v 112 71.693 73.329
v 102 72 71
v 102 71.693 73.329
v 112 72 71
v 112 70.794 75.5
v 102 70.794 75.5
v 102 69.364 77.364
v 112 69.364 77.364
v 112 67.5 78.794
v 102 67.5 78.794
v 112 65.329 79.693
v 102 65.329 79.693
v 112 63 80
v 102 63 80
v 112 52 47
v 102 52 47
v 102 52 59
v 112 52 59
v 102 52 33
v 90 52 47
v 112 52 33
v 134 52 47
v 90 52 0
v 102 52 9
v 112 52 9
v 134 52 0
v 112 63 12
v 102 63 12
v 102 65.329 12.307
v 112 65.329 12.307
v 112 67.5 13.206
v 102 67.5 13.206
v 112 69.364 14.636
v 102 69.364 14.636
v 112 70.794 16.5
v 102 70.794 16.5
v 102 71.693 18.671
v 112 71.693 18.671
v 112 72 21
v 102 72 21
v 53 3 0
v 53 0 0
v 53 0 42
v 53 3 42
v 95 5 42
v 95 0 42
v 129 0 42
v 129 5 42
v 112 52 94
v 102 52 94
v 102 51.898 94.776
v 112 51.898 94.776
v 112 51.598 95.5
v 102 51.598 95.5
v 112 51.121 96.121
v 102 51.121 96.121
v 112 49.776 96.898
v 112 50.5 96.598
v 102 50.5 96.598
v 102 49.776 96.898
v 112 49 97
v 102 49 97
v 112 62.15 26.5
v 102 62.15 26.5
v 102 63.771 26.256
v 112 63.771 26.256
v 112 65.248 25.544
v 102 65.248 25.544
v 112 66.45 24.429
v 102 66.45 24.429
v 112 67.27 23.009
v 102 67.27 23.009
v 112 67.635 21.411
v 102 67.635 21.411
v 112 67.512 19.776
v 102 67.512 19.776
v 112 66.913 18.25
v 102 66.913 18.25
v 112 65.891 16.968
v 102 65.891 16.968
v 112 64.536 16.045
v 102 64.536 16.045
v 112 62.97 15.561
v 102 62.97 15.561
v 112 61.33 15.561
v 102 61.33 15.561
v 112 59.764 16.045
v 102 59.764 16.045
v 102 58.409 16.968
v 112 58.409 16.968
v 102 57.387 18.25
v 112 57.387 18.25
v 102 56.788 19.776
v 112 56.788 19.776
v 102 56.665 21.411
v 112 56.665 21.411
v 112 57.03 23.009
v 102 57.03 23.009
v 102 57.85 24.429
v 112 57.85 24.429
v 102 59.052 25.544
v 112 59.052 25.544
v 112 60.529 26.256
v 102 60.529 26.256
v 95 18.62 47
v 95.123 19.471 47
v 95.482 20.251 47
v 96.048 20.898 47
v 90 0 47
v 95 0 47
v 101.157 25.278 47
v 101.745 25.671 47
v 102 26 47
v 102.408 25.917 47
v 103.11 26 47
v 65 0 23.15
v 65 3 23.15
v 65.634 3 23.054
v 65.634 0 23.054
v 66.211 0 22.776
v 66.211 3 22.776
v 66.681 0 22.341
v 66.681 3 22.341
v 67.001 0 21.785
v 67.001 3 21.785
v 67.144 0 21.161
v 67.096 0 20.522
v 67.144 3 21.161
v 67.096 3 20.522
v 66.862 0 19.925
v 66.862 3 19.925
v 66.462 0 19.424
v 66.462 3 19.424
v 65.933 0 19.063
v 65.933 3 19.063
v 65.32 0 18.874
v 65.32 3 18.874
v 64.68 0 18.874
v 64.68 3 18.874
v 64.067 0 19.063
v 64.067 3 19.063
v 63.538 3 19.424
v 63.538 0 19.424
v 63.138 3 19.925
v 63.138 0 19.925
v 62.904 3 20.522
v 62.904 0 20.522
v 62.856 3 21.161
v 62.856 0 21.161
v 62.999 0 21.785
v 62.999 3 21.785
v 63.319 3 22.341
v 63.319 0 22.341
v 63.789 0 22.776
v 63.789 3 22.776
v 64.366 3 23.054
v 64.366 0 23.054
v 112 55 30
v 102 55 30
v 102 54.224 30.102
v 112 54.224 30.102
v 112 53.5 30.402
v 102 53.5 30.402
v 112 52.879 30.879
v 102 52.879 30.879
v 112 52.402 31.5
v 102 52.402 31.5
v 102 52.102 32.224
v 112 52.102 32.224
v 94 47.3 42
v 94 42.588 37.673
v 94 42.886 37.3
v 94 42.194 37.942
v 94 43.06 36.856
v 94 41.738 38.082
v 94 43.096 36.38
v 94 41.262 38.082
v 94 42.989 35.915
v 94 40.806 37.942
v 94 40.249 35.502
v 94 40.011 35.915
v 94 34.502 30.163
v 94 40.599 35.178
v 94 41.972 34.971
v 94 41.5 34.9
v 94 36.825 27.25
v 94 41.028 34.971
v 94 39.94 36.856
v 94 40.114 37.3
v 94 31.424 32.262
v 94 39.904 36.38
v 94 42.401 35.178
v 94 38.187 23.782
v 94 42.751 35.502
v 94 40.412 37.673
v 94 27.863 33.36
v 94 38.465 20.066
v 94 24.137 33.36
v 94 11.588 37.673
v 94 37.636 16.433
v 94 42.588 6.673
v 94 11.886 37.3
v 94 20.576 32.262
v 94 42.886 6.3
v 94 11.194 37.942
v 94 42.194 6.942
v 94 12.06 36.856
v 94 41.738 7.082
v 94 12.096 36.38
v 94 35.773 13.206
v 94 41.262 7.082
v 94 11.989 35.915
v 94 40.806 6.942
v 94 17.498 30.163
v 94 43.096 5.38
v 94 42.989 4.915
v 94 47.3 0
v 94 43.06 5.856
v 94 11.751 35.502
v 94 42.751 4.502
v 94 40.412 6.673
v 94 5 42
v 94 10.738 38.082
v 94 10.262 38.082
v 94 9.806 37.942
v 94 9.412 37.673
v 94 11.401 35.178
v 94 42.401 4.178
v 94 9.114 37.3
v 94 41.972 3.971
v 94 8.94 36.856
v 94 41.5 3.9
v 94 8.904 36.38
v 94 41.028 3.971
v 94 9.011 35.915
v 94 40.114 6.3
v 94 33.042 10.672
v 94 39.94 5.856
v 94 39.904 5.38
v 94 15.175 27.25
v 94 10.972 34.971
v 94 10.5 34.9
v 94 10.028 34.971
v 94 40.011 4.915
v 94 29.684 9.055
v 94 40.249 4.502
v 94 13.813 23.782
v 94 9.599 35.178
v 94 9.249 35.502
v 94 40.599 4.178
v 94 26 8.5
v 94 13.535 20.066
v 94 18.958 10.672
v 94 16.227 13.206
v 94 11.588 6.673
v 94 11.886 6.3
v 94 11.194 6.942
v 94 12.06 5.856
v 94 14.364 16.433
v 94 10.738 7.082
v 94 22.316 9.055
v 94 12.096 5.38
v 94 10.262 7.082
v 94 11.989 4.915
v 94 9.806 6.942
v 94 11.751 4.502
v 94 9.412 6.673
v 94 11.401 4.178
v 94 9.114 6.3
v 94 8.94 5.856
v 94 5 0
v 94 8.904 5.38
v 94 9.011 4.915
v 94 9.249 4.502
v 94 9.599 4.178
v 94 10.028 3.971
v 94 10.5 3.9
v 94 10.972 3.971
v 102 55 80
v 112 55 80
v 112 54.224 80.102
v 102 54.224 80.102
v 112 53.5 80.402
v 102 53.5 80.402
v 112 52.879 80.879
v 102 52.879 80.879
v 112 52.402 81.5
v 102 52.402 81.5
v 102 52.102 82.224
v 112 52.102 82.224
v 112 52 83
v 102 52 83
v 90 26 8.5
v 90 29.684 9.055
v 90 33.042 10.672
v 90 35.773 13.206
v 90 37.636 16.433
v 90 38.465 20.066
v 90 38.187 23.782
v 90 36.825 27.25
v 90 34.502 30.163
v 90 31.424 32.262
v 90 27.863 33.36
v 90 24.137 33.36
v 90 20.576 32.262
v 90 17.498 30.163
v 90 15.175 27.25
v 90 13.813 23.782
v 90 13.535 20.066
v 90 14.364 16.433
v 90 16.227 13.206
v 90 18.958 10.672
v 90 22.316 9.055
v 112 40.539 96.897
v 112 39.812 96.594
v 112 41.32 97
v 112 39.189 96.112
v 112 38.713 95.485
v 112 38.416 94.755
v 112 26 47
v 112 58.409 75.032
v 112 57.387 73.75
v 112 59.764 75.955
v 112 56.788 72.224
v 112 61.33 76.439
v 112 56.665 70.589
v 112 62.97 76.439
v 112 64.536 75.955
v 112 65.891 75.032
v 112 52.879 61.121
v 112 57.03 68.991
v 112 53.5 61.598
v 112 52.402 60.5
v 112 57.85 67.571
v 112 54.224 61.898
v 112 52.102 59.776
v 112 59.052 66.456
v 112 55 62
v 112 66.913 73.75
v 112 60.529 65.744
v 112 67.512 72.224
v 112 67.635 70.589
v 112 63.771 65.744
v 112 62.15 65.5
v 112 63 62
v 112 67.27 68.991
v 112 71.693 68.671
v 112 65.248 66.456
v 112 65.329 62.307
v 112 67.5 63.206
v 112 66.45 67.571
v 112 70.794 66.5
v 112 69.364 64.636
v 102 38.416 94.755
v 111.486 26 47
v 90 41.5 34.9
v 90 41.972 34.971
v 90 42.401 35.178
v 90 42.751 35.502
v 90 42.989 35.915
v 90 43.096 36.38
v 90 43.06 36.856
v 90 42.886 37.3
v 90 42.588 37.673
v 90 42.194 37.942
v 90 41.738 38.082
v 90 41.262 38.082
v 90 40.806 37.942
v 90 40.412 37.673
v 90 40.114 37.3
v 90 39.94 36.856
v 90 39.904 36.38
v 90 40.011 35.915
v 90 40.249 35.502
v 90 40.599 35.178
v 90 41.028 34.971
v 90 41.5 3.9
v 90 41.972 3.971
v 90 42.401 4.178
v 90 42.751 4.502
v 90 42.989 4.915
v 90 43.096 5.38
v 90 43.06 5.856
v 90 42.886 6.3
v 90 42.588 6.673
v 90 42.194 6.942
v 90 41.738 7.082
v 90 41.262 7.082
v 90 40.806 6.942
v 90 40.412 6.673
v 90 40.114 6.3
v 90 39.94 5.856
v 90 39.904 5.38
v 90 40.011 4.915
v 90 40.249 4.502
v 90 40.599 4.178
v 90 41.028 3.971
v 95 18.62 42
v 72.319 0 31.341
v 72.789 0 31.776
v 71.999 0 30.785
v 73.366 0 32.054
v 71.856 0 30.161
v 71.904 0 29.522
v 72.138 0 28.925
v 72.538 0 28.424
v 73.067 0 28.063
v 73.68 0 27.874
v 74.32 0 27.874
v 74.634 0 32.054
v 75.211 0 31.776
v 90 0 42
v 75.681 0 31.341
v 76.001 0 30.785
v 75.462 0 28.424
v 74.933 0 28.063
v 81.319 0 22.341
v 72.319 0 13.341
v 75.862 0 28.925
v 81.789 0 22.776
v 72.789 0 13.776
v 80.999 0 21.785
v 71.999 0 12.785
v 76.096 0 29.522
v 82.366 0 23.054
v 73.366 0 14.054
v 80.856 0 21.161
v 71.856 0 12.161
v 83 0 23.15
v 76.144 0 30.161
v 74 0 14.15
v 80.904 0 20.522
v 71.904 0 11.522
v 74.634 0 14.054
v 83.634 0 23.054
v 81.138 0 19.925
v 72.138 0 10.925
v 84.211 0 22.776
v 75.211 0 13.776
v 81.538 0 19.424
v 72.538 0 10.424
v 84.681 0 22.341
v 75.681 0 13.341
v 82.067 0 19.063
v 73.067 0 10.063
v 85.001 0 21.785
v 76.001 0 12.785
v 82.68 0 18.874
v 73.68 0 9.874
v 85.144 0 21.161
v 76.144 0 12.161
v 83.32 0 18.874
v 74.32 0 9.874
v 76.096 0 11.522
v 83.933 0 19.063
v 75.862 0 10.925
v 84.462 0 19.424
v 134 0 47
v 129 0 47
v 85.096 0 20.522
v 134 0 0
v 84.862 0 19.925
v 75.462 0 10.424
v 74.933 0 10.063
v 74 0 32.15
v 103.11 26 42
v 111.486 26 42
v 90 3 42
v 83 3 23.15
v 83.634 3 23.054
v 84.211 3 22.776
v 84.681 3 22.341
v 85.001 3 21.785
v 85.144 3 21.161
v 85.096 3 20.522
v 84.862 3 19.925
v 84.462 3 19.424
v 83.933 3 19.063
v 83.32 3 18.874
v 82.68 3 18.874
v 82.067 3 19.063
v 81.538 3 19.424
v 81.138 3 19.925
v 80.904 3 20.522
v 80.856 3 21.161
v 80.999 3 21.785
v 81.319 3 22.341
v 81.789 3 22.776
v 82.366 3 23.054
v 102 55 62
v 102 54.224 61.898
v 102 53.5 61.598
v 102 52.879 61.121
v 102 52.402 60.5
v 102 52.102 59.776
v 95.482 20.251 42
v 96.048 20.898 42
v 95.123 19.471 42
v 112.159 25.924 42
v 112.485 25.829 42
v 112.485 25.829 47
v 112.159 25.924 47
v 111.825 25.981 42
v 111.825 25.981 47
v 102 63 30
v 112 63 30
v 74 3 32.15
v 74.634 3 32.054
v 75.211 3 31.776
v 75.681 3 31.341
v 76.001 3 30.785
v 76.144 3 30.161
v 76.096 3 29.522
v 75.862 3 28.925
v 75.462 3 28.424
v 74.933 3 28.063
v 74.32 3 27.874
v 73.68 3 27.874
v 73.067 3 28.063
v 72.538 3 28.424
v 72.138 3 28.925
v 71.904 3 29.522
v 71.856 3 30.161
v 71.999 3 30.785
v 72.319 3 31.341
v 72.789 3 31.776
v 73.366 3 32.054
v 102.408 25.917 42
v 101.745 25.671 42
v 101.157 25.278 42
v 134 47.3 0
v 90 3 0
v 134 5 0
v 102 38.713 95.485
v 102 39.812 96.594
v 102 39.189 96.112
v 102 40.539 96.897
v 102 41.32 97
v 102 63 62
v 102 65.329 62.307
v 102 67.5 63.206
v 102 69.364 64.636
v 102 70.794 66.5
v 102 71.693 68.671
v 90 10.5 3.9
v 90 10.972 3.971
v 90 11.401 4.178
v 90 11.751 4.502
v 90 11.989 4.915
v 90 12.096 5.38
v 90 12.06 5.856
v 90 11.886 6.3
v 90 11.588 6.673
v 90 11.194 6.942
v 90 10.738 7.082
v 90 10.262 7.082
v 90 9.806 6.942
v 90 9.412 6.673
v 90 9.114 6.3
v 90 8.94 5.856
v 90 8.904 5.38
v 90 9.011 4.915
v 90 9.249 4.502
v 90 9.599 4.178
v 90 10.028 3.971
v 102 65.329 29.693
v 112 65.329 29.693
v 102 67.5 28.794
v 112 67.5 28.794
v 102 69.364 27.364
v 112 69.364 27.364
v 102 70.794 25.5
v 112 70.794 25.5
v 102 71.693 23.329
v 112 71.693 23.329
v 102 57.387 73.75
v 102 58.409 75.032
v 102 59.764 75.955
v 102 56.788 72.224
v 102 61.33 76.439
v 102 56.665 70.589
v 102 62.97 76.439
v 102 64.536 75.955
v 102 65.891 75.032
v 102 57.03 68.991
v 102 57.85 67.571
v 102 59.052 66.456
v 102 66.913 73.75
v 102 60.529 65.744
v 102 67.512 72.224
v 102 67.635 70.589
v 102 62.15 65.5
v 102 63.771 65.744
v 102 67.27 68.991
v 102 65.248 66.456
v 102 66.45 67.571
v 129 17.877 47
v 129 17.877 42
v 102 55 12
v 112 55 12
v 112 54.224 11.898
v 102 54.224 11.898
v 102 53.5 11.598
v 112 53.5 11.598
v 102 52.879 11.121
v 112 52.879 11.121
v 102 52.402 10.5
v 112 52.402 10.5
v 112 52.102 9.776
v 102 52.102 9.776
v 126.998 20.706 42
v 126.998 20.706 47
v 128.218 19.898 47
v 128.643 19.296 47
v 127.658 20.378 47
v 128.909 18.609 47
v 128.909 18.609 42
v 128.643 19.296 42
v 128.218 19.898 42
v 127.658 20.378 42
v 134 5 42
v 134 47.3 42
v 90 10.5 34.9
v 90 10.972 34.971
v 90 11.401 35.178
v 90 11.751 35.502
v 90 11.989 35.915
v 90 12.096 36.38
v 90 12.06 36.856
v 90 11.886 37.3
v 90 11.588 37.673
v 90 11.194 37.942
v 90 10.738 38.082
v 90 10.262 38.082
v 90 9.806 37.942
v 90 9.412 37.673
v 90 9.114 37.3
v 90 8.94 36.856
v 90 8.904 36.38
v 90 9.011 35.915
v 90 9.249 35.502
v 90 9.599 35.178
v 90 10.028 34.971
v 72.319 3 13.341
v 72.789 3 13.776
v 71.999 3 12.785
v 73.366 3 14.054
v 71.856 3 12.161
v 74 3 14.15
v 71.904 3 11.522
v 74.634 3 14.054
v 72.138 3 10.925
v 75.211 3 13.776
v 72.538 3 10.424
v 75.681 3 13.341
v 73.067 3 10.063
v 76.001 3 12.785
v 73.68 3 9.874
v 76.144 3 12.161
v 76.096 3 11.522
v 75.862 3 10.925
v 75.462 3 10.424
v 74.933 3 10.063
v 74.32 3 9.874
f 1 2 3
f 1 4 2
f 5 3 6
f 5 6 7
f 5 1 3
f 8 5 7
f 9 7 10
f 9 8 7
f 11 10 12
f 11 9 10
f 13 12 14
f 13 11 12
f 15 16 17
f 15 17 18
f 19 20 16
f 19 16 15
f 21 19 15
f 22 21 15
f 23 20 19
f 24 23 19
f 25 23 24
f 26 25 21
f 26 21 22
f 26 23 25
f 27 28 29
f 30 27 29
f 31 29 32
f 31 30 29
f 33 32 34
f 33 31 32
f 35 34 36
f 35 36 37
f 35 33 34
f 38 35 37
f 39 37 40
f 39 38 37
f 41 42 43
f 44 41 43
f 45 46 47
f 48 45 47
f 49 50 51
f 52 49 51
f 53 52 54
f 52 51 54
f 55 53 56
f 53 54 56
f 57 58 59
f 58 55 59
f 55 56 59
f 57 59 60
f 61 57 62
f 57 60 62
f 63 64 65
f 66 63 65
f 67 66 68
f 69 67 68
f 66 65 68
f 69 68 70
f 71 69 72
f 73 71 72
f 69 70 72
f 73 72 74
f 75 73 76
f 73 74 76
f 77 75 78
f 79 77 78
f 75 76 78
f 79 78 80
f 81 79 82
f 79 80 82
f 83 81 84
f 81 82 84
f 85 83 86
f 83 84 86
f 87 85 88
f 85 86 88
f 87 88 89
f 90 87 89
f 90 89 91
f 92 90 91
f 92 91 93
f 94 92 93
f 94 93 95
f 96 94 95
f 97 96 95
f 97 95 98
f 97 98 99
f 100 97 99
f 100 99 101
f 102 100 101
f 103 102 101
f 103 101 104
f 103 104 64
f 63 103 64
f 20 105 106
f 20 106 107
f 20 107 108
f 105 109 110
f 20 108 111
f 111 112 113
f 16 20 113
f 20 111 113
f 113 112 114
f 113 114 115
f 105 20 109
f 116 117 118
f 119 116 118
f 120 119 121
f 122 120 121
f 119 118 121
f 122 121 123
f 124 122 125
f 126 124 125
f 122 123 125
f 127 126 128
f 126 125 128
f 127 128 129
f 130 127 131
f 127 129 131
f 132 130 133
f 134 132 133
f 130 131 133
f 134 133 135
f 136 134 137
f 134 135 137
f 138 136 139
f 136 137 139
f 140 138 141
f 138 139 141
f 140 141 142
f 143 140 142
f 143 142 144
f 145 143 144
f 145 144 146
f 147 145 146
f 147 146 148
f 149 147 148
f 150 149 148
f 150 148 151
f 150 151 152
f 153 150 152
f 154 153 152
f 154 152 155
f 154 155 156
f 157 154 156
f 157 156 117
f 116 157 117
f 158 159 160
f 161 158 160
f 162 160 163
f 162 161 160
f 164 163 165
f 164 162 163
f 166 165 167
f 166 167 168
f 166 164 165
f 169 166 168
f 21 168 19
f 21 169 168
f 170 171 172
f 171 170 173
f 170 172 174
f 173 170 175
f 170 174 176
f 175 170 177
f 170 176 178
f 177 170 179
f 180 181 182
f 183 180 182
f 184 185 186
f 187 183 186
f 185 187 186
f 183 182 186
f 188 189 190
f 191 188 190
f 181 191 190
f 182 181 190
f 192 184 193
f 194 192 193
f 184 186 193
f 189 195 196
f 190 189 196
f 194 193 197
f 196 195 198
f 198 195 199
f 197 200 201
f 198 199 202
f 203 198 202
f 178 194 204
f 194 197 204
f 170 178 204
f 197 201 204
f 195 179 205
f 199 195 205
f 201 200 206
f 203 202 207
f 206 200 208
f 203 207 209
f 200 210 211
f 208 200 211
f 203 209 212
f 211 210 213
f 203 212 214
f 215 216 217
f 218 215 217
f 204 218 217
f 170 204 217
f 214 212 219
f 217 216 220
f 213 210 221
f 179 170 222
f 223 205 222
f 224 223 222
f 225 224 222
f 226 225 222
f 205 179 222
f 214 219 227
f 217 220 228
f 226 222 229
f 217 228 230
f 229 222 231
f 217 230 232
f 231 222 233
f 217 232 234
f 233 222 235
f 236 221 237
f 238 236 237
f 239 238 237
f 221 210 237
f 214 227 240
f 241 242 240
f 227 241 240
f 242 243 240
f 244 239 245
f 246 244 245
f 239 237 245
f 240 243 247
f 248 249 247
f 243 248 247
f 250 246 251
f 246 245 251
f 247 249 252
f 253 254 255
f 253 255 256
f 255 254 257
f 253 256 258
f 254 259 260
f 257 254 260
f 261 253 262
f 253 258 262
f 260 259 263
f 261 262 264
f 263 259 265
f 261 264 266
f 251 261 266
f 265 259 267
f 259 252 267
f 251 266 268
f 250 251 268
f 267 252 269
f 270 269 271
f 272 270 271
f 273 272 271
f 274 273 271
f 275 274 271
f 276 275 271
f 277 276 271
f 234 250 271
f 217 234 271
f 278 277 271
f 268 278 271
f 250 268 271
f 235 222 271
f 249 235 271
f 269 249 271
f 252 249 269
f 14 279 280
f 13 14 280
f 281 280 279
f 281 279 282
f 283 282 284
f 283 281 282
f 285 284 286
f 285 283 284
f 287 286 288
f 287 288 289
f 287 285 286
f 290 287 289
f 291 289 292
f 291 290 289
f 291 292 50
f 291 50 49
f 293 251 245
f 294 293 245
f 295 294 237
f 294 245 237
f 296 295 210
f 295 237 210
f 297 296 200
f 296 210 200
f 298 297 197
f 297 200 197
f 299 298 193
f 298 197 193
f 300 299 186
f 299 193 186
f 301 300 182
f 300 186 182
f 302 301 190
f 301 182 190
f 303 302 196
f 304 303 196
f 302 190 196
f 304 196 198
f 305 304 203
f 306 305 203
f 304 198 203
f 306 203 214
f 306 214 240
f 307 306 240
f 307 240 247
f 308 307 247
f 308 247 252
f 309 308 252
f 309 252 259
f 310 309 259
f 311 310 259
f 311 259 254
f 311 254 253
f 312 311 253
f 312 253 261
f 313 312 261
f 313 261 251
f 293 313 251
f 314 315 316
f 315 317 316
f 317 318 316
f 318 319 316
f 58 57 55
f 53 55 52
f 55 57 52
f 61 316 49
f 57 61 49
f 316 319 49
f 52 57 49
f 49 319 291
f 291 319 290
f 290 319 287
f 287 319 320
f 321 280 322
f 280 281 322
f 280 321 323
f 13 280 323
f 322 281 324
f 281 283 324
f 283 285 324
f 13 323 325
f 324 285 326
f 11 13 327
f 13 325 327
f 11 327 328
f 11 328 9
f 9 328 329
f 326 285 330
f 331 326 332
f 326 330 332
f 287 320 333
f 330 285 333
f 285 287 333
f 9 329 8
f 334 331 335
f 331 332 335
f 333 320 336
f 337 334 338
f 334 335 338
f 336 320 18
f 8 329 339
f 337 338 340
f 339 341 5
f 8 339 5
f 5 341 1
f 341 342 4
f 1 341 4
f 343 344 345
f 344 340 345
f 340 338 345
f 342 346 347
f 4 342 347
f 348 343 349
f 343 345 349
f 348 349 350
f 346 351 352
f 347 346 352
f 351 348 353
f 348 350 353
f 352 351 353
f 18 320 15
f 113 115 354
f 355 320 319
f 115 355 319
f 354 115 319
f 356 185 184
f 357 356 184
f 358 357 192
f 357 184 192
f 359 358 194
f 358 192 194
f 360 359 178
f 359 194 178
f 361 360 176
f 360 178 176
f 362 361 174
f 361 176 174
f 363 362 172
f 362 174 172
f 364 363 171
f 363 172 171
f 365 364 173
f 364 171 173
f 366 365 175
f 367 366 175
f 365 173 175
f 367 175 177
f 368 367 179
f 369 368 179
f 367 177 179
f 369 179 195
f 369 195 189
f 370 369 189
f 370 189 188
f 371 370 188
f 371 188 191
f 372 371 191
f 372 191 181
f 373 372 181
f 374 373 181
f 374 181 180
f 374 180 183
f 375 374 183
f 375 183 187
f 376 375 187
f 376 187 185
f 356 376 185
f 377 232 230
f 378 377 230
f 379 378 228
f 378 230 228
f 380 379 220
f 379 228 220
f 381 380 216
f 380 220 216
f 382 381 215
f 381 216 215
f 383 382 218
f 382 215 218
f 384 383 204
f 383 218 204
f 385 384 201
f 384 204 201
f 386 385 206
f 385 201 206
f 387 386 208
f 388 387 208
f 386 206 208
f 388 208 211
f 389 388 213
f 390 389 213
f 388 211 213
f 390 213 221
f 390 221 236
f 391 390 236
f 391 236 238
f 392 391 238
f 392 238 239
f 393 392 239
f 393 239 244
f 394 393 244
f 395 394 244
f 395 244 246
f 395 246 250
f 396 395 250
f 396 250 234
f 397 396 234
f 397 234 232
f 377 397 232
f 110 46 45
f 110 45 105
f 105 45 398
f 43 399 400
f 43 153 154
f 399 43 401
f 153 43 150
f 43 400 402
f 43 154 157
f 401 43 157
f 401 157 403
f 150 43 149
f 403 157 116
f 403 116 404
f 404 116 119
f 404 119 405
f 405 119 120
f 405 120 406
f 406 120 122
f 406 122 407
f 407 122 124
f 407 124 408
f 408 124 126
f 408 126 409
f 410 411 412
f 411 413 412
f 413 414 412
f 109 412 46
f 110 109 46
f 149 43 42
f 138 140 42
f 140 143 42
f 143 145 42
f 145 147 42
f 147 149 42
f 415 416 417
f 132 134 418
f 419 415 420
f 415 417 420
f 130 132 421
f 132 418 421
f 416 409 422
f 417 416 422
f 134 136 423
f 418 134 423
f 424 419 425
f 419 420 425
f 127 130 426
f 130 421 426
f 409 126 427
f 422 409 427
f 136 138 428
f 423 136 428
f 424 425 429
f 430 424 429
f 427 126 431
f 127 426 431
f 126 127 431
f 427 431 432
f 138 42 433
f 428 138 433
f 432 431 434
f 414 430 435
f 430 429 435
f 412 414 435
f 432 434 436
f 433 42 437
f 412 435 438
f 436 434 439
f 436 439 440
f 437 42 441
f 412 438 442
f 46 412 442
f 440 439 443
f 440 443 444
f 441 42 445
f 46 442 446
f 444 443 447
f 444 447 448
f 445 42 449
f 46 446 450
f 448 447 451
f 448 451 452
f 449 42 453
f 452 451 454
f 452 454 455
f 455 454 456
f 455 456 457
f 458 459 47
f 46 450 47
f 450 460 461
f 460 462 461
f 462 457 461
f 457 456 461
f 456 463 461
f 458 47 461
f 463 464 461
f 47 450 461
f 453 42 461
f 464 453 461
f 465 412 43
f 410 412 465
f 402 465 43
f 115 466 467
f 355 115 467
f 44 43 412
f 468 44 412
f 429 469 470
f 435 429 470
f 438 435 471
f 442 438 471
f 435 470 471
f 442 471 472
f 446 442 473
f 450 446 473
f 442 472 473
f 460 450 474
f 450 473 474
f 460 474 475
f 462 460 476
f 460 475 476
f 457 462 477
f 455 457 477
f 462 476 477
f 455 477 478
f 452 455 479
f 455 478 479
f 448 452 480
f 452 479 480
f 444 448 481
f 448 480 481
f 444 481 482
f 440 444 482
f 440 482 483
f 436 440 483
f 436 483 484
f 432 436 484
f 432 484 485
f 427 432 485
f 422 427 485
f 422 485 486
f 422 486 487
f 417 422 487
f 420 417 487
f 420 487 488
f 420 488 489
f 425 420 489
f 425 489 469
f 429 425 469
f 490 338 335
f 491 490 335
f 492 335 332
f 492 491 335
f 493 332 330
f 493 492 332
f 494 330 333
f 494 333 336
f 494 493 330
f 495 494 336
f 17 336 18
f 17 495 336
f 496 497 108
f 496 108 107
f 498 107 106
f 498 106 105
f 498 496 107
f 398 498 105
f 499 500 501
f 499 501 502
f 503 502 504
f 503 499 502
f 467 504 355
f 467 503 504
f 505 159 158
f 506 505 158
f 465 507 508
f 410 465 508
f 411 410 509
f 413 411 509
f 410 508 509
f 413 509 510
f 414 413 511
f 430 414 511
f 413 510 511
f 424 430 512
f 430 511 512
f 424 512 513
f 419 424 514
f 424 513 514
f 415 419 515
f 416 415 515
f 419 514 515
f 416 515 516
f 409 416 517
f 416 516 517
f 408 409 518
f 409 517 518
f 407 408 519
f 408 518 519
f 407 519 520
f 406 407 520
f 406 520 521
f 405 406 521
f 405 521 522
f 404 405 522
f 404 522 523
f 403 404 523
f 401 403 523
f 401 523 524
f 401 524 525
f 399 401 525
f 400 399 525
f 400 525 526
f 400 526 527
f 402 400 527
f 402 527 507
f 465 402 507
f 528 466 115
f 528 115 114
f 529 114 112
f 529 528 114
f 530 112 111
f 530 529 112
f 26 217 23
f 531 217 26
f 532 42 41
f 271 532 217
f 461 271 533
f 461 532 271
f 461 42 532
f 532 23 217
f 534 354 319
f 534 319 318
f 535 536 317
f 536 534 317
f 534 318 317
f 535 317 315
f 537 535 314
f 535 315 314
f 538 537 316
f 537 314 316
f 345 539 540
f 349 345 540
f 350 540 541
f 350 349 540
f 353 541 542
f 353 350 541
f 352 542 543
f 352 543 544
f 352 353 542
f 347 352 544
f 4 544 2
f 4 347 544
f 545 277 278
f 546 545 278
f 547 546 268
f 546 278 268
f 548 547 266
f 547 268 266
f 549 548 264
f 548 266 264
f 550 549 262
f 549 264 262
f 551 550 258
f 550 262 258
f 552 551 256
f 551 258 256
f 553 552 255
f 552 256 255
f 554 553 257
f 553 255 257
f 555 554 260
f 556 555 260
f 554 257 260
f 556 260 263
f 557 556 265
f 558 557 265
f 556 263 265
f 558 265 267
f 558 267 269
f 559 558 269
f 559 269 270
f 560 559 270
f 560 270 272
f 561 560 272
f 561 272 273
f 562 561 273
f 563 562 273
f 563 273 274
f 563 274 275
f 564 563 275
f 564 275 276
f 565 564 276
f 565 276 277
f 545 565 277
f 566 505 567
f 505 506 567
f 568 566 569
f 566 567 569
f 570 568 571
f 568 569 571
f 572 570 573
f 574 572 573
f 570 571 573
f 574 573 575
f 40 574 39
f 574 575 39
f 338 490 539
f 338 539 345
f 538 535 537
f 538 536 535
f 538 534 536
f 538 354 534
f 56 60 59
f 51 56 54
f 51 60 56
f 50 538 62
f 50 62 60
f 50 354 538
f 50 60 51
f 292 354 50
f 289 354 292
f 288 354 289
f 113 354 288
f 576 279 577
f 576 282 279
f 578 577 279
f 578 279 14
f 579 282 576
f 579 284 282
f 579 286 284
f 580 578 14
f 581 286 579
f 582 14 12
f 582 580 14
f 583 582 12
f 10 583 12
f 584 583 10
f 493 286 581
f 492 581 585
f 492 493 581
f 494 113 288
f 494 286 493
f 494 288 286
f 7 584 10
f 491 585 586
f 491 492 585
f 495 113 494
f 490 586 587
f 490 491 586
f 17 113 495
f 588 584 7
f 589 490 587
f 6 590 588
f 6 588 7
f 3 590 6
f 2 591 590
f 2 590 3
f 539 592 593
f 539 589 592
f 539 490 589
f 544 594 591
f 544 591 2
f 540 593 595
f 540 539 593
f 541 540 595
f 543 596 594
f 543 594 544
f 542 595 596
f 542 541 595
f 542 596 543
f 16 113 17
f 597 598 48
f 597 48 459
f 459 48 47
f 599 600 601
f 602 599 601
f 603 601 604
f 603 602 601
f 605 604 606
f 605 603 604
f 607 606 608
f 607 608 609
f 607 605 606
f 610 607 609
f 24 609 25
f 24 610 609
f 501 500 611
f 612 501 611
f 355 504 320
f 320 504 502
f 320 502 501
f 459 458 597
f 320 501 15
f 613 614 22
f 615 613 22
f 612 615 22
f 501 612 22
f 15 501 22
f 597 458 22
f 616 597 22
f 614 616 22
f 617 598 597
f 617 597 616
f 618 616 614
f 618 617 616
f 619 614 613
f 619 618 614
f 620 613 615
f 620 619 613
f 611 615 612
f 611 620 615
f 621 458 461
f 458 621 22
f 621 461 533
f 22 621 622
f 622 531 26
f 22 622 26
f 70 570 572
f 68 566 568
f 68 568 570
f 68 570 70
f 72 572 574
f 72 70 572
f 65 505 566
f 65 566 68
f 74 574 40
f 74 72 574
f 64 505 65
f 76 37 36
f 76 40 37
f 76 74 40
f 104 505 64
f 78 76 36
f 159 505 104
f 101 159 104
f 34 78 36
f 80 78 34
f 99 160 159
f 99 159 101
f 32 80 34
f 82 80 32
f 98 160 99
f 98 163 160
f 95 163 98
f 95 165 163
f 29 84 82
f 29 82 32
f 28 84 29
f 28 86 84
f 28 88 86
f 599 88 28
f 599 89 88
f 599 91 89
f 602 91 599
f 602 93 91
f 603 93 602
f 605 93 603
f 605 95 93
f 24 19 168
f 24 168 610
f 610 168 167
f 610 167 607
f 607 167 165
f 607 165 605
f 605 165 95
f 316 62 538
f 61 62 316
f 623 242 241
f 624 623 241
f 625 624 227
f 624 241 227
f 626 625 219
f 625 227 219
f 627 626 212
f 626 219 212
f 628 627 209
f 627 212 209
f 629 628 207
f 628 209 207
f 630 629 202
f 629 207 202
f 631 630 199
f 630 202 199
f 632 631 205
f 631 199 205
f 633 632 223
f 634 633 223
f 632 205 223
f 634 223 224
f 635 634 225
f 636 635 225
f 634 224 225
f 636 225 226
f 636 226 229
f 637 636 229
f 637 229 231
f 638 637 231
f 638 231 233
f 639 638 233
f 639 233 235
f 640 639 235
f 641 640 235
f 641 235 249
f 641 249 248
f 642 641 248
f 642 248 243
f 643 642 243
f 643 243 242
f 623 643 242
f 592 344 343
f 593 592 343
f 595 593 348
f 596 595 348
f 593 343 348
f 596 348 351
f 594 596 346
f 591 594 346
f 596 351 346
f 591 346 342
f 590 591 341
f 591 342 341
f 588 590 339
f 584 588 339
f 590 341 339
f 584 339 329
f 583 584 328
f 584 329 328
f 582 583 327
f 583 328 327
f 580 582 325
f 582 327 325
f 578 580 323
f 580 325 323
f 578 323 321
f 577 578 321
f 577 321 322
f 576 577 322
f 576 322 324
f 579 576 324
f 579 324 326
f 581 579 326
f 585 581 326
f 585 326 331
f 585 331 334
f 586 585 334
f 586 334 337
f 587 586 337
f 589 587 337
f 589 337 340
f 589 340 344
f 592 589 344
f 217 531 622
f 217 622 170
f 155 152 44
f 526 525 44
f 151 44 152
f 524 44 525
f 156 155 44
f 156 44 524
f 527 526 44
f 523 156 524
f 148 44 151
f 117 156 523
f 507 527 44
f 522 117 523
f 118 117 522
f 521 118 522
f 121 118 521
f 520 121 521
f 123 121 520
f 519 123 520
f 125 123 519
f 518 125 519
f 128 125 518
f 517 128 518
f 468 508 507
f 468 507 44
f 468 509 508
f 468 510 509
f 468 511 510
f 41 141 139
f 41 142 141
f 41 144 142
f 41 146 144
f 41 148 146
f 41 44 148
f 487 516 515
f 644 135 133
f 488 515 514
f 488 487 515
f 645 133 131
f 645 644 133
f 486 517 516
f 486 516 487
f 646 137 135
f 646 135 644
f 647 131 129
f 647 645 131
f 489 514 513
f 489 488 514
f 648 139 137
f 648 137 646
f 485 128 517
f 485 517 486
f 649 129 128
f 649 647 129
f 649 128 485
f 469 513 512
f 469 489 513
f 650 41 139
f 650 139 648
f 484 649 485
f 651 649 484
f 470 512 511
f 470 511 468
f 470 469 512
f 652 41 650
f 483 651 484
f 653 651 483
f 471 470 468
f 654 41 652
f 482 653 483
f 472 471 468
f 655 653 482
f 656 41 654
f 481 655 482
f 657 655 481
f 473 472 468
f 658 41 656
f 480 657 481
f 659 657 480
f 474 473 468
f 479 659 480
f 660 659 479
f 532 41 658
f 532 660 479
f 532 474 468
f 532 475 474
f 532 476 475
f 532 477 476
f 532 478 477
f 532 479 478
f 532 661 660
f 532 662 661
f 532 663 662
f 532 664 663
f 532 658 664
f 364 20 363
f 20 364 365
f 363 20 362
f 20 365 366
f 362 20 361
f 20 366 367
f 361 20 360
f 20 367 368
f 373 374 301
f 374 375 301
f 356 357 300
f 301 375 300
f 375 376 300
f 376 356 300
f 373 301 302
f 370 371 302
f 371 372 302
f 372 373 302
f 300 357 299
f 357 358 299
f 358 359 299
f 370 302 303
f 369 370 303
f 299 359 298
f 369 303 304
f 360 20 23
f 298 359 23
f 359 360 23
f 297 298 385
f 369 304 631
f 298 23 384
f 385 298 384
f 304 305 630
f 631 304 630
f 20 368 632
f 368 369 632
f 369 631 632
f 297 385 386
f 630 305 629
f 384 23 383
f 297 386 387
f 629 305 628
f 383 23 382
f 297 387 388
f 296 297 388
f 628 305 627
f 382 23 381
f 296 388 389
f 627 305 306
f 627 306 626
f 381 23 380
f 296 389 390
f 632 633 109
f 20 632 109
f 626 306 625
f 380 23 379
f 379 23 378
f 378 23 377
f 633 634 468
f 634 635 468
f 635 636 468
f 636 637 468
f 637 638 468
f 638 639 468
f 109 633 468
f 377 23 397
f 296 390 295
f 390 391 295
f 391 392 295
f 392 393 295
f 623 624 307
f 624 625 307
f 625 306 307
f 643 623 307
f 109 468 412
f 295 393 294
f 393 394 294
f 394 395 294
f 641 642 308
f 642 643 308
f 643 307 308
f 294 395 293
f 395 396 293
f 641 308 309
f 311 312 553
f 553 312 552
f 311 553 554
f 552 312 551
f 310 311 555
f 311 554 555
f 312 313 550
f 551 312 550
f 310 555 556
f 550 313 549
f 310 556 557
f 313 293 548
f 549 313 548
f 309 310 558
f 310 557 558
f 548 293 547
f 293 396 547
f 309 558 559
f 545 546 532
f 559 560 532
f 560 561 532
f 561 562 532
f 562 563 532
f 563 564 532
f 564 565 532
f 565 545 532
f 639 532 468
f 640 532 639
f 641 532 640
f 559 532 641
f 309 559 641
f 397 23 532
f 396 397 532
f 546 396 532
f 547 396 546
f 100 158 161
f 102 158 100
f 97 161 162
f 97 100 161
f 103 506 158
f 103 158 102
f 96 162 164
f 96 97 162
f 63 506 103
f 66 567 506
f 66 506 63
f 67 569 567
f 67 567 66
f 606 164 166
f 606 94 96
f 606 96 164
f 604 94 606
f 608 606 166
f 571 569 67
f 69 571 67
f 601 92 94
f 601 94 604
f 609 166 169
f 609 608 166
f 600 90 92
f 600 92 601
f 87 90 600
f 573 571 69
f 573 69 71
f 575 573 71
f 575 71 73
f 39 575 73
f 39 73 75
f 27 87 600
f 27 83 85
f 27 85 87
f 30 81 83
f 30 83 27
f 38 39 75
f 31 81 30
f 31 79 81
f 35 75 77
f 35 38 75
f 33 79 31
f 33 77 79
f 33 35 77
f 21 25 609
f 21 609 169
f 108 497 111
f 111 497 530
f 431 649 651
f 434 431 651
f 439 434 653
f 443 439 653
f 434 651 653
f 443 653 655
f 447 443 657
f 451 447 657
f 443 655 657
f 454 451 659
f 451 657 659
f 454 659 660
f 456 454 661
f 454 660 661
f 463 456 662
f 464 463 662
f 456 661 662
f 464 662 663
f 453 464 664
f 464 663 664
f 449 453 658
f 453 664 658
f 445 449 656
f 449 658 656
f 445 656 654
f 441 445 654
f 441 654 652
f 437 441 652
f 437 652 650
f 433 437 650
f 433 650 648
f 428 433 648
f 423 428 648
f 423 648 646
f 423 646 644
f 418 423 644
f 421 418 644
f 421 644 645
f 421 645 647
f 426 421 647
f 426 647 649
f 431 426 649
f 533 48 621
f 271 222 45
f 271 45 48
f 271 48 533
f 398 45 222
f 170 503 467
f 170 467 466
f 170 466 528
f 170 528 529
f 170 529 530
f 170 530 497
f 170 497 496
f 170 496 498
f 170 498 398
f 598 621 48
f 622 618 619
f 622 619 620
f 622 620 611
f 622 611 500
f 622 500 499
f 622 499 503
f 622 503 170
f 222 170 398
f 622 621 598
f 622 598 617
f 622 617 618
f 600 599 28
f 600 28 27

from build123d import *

# Parameters (mm, degrees)
SKETCH1_W            = 94
SKETCH1_H            = 42
BOSS_EXTRUDE1_DEPTH  = 3
SKETCH2_W            = 4
SKETCH2_H            = 42
BOSS_EXTRUDE2_DEPTH  = 47
SKETCH3_R            = 12.5
SKETCH3_R_2          = 1.6
CUT_EXTRUDE1_DEPTH   = 114.176852757
SKETCH4_W            = 42
SKETCH4_H            = 5
BOSS_EXTRUDE3_DEPTH  = 40
SKETCH5_W            = 42
SKETCH5_H            = 5
BOSS_EXTRUDE4_DEPTH  = 38
SKETCH7_W            = 42
SKETCH7_H            = 42
SKETCH7_W_2          = 44
BOSS_EXTRUDE6_DEPTH  = 5
SKETCH9_R            = 2.15
CUT_EXTRUDE2_DEPTH   = 149.731301346
SKETCH11_W           = 10
SKETCH11_H           = 18
BOSS_EXTRUDE7_DEPTH  = 20
SKETCH13_R           = 5.5
CUT_EXTRUDE3_DEPTH   = 169.988165266
BOSS_EXTRUDE11_DEPTH = 5
SKETCH23_W           = 10
SKETCH23_H           = 26
BOSS_EXTRUDE12_DEPTH = 50
CUT_EXTRUDE7_DEPTH   = 193.595430891
SKETCH25_W           = 10
SKETCH25_H           = 18
BOSS_EXTRUDE13_DEPTH = 20
SKETCH26_R           = 5.5
CUT_EXTRUDE8_DEPTH   = 193.595430891
SKETCH27_W           = 12
SKETCH27_H           = 18
BOSS_EXTRUDE14_DEPTH = 69
CUT_EXTRUDE10_START  = -5
SKETCH28_R           = 5.5
CUT_EXTRUDE10_DEPTH  = 5
SKETCH29_R           = 5.5
CUT_EXTRUDE11_DEPTH  = 5
FILLET4_R            = 9
FILLET3_R            = 3
SKETCH30_W           = 91
SKETCH30_H           = 42
CUT_EXTRUDE12_DEPTH  = 181.413414135
SKETCH31_W           = 40
SKETCH31_H           = 0.3
CUT_EXTRUDE13_DEPTH  = 42


# Some blends are built 0.0001 mm under size
with BuildPart() as part:
    # Sketch1 → Boss-Extrude1 (new body)
    with BuildSketch(Plane(origin=(0, 0, 0), x_dir=(1, 0, 0), z_dir=(0, 1, 0))):
        with Locations((47, -21)):
            Rectangle(SKETCH1_W, SKETCH1_H)
    extrude(amount=BOSS_EXTRUDE1_DEPTH)

    # Sketch2 → Boss-Extrude2 (add)
    with BuildSketch(Plane.XZ):
        with Locations((2, 21)):
            Rectangle(SKETCH2_W, SKETCH2_H)
        with Locations((92, 21)):
            Rectangle(SKETCH2_W, SKETCH2_H)
    extrude(amount=-BOSS_EXTRUDE2_DEPTH)

    # Sketch3 → Cut-Extrude1 (cut, through all)
    with BuildSketch(Plane(origin=(94, 0, 0), x_dir=(0, 0, -1), z_dir=(1, 0, 0))):
        with Locations((-21, 26)):
            Circle(SKETCH3_R)
        with Locations((-36.5, 41.5)):
            Circle(SKETCH3_R_2)
        with Locations((-5.5, 41.5)):
            Circle(SKETCH3_R_2)
        with Locations((-36.5, 10.5)):
            Circle(SKETCH3_R_2)
        with Locations((-5.5, 10.5)):
            Circle(SKETCH3_R_2)
    extrude(amount=-CUT_EXTRUDE1_DEPTH, mode=Mode.SUBTRACT)

    # Sketch4 → Boss-Extrude3 (add)
    with BuildSketch(Plane(origin=(94, 0, 0), x_dir=(0, 0, -1), z_dir=(1, 0, 0))):
        with Locations((-21, 2.5)):
            Rectangle(SKETCH4_W, SKETCH4_H)
    extrude(amount=BOSS_EXTRUDE3_DEPTH)

    # Sketch5 → Boss-Extrude4 (add)
    with BuildSketch(Plane.ZY):
        with Locations((21, 2.5)):
            Rectangle(SKETCH5_W, SKETCH5_H)
    extrude(amount=BOSS_EXTRUDE4_DEPTH)

    # Sketch7 → Boss-Extrude6 (add)
    with BuildSketch(Plane(origin=(0, 47, 0), x_dir=(1, 0, 0), z_dir=(0, 1, 0))):
        with Locations((-17, -21)):
            Rectangle(SKETCH7_W, SKETCH7_H)
        with Locations((112, -21)):
            Rectangle(SKETCH7_W_2, SKETCH7_H)
    extrude(amount=BOSS_EXTRUDE6_DEPTH)

    # Sketch9 → Cut-Extrude2 (cut, through all)
    with BuildSketch(Plane(origin=(0, 3, 0), x_dir=(1, 0, 0), z_dir=(0, 1, 0))):
        with Locations(Location((83, -21, 0), (0, 0, 270))):
            Circle(SKETCH9_R)
        with Locations(Location((65, -21, 0), (0, 0, 270))):
            Circle(SKETCH9_R)
        with Locations(Location((74, -12, 0), (0, 0, 270))):
            Circle(SKETCH9_R)
        with Locations(Location((74, -30, 0), (0, 0, 270))):
            Circle(SKETCH9_R)
        with Locations(Location((22, -12, 0), (0, 0, 270))):
            Circle(SKETCH9_R)
        with Locations(Location((22, -30, 0), (0, 0, 270))):
            Circle(SKETCH9_R)
    extrude(amount=-CUT_EXTRUDE2_DEPTH, mode=Mode.SUBTRACT)

    # Sketch11 → Boss-Extrude7 (add)
    with BuildSketch(Plane(origin=(0, 52, 0), x_dir=(1, 0, 0), z_dir=(0, 1, 0))):
        with Locations((-8, -21)):
            Rectangle(SKETCH11_W, SKETCH11_H)
        with Locations((107, -21)):
            Rectangle(SKETCH11_W, SKETCH11_H)
    extrude(amount=BOSS_EXTRUDE7_DEPTH)

    # Sketch13 → Cut-Extrude3 (cut, through all)
    with BuildSketch(Plane.ZY.offset(13)):
        with Locations((21, 62.15)):
            Circle(SKETCH13_R)
    extrude(amount=-CUT_EXTRUDE3_DEPTH, mode=Mode.SUBTRACT)

    # Sketch20 → Boss-Extrude11 (add)
    with BuildSketch(Plane.XY.offset(42)):
        Polygon((134, 0), (134, 52), (90, 52), (90, 0), (95, 0), (95, 20), (102, 26), (112, 26), (129, 20), (129, 0), align=None)
    extrude(amount=BOSS_EXTRUDE11_DEPTH)

    # Sketch23 → Boss-Extrude12 (add)
    with BuildSketch(Plane.XY.offset(47)):
        with Locations((107, 39)):
            Rectangle(SKETCH23_W, SKETCH23_H)
    extrude(amount=BOSS_EXTRUDE12_DEPTH)

    # Sketch24 → Cut-Extrude7 (cut, through all)
    with BuildSketch(Plane(origin=(112, 0, 0), x_dir=(0, 0, -1), z_dir=(1, 0, 0))):
        Polygon((-47, 26), (-97, 39), (-97, 26), align=None)
    extrude(amount=-CUT_EXTRUDE7_DEPTH, mode=Mode.SUBTRACT)

    # Sketch25 → Boss-Extrude13 (add)
    with BuildSketch(Plane(origin=(0, 52, 0), x_dir=(1, 0, 0), z_dir=(0, 1, 0))):
        with Locations((107, -71)):
            Rectangle(SKETCH25_W, SKETCH25_H)
    extrude(amount=BOSS_EXTRUDE13_DEPTH)

    # Sketch26 → Cut-Extrude8 (cut, through all)
    with BuildSketch(Plane(origin=(112, 0, 0), x_dir=(0, 0, -1), z_dir=(1, 0, 0))):
        with Locations((-71, 62.15)):
            Circle(SKETCH26_R)
    extrude(amount=-CUT_EXTRUDE8_DEPTH, mode=Mode.SUBTRACT)

    # Sketch27 → Boss-Extrude14 (add)
    with BuildSketch(Plane(origin=(0, 3, 0), x_dir=(1, 0, 0), z_dir=(0, 1, 0))):
        with Locations((47, -21)):
            Rectangle(SKETCH27_W, SKETCH27_H)
    extrude(amount=BOSS_EXTRUDE14_DEPTH)

    # Sketch28 → Cut-Extrude10 (cut)
    with BuildSketch(Plane(origin=(53, 0, 0), x_dir=(0, 0, -1), z_dir=(1, 0, 0)).offset(CUT_EXTRUDE10_START)):
        with Locations(Location((-21, 62.15, 0), (0, 0, 180))):
            Circle(SKETCH28_R)
    extrude(amount=CUT_EXTRUDE10_DEPTH, mode=Mode.SUBTRACT)

    # Sketch29 → Cut-Extrude11 (cut)
    with BuildSketch(Plane.ZY.offset(-41)):
        with Locations((21, 62.15)):
            Circle(SKETCH29_R)
    extrude(amount=-CUT_EXTRUDE11_DEPTH, mode=Mode.SUBTRACT)

    # Fillet4
    fillet4_edges = [part.edges().sort_by_distance(p)[0] for p in [
        (-8, 72, 12),
        (-8, 72, 30),
        (107, 72, 12),
        (107, 72, 30),
        (107, 72, 62),
        (107, 72, 80),
        (47, 72, 12),
        (47, 72, 30),
    ]]
    fillet(fillet4_edges, radius=FILLET4_R - 0.0001)  # a hair under: the kernel refuses the full size

    # Fillet3
    # the kernel refuses this fillet: 3 mm, written as the material it adds along each edge
    with BuildSketch(Plane(origin=(-3, 52, 30), x_dir=(0, 1, 0), z_dir=(-1, 0, 0)), Plane(origin=(112, 52, 80), x_dir=(0, 1, 0), z_dir=(-1, 0, 0))) as fillet3_piece_1:
        with BuildLine():
            CenterArc((FILLET3_R, -FILLET3_R), FILLET3_R, 90, 90)
            Line((0, -FILLET3_R), (0, 0))
            Line((0, 0), (FILLET3_R, 0))
        make_face()
    extrude(amount=10)
    with BuildSketch(Plane(origin=(-13, 52, 12), x_dir=(0, 0, -1), z_dir=(1, 0, 0)), Plane(origin=(112, 52, 30), x_dir=(0, 0, 1), z_dir=(-1, 0, 0)), Plane(origin=(102, 52, 12), x_dir=(0, 0, -1), z_dir=(1, 0, 0)), Plane(origin=(102, 52, 62), x_dir=(0, 0, -1), z_dir=(1, 0, 0))) as fillet3_piece_2:
        with BuildLine():
            CenterArc((FILLET3_R, FILLET3_R), FILLET3_R, 180, 90)
            Line((0, FILLET3_R), (0, 0))
            Line((0, 0), (FILLET3_R, 0))
        make_face()
    extrude(amount=10)
    with BuildSketch(Plane(origin=(95, 20, 42), x_dir=(0, -1, 0), z_dir=(0, 0, 1))) as fillet3_piece_3:
        with BuildLine():
            CenterArc((FILLET3_R * 0.45993492247, FILLET3_R), FILLET3_R, 220.601294645, 49.398705355)
            Line((-FILLET3_R * 0.299321679895, FILLET3_R * 0.349208626544), (0, 0))
            Line((0, 0), (FILLET3_R * 0.45993492247, 0))
        make_face()
    extrude(amount=5)
    with BuildSketch(Plane(origin=(102, 26, 42), x_dir=(-0.7592566023652966, -0.6507913734559685, 0), z_dir=(0, 0, 1))) as fillet3_piece_4:
        with BuildLine():
            CenterArc((FILLET3_R * 0.369924076215, FILLET3_R), FILLET3_R, 229.398705355, 40.601294645)
            Line((-FILLET3_R * 0.28086729724, FILLET3_R * 0.240743397635), (0, 0))
            Line((0, 0), (FILLET3_R * 0.369924076215, 0))
        make_face()
    extrude(amount=5)
    with BuildSketch(Plane(origin=(112, 26, 42), x_dir=(0.942990333582889, -0.3328201177351389, 0), z_dir=(0, 0, 1))) as fillet3_piece_5:
        with BuildLine():
            CenterArc((FILLET3_R * 0.171292729553, -FILLET3_R), FILLET3_R, 90, 19.440034828)
            Line((-FILLET3_R * 0.161527388182, -FILLET3_R * 0.0570096664171), (0, 0))
            Line((0, 0), (FILLET3_R * 0.171292729553, 0))
        make_face()
    extrude(amount=5)
    with BuildSketch(Plane(origin=(129, 20, 42), x_dir=(0, -1, 0), z_dir=(0, 0, 1))) as fillet3_piece_6:
        with BuildLine():
            CenterArc((FILLET3_R * 0.707515081019, -FILLET3_R), FILLET3_R, 90, 70.559965172)
            Line((-FILLET3_R * 0.235475252564, -FILLET3_R * 0.667179882265), (0, 0))
            Line((0, 0), (FILLET3_R * 0.707515081019, 0))
        make_face()
    extrude(amount=5)
    with BuildSketch(Plane(origin=(53, 3, 30), x_dir=(0, 0, 1), z_dir=(-1, 0, 0)), Plane(origin=(41, 3, 12), x_dir=(0, 0, -1), z_dir=(1, 0, 0))) as fillet3_piece_7:
        with BuildLine():
            CenterArc((FILLET3_R, FILLET3_R), FILLET3_R, 180, 90)
            Line((0, FILLET3_R), (0, 0))
            Line((0, 0), (FILLET3_R, 0))
        make_face()
    extrude(amount=12)
    # the kernel refuses this fillet: 3 mm, written as the material it takes off along each edge
    with BuildSketch(Plane(origin=(94.5, 52, 97), x_dir=(0, 0, -1), z_dir=(1, 0, 0))) as fillet3_2_piece_1:
        with BuildLine():
            CenterArc((FILLET3_R, -FILLET3_R), FILLET3_R, 90, 90)
            Line((0, -FILLET3_R), (0, 0))
            Line((0, 0), (FILLET3_R, 0))
        make_face()
    extrude(amount=25, mode=Mode.SUBTRACT)
    with BuildSketch(Plane(origin=(117.799354812, 39, 97), x_dir=(0, -0.25163385176495195, -0.9678225067882716), z_dir=(-1, 0, 0))) as fillet3_2_piece_2:
        with BuildLine():
            CenterArc((FILLET3_R * 0.773247308247, -FILLET3_R), FILLET3_R, 90, 75.425783802)
            Line((-FILLET3_R * 0.194575198541, -FILLET3_R * 0.748366148235), (0, 0))
            Line((0, 0), (FILLET3_R * 0.773247308247, 0))
        make_face()
    extrude(amount=21.598709624, mode=Mode.SUBTRACT)

    # Sketch30 → Cut-Extrude12 (cut, through all)
    with BuildSketch(Plane.XZ):
        with Locations((7.5, 21)):
            Rectangle(SKETCH30_W, SKETCH30_H)
    extrude(amount=-CUT_EXTRUDE12_DEPTH, mode=Mode.SUBTRACT)

    # Sketch31 → Cut-Extrude13 (cut)
    with BuildSketch(Plane(origin=(0, 0, 0), x_dir=(-1, 0, 0), z_dir=(0, 0, -1))):
        with Locations((-114, 47.15)):
            Rectangle(SKETCH31_W, SKETCH31_H)
    extrude(amount=-CUT_EXTRUDE13_DEPTH, mode=Mode.SUBTRACT)


solid = part.part
